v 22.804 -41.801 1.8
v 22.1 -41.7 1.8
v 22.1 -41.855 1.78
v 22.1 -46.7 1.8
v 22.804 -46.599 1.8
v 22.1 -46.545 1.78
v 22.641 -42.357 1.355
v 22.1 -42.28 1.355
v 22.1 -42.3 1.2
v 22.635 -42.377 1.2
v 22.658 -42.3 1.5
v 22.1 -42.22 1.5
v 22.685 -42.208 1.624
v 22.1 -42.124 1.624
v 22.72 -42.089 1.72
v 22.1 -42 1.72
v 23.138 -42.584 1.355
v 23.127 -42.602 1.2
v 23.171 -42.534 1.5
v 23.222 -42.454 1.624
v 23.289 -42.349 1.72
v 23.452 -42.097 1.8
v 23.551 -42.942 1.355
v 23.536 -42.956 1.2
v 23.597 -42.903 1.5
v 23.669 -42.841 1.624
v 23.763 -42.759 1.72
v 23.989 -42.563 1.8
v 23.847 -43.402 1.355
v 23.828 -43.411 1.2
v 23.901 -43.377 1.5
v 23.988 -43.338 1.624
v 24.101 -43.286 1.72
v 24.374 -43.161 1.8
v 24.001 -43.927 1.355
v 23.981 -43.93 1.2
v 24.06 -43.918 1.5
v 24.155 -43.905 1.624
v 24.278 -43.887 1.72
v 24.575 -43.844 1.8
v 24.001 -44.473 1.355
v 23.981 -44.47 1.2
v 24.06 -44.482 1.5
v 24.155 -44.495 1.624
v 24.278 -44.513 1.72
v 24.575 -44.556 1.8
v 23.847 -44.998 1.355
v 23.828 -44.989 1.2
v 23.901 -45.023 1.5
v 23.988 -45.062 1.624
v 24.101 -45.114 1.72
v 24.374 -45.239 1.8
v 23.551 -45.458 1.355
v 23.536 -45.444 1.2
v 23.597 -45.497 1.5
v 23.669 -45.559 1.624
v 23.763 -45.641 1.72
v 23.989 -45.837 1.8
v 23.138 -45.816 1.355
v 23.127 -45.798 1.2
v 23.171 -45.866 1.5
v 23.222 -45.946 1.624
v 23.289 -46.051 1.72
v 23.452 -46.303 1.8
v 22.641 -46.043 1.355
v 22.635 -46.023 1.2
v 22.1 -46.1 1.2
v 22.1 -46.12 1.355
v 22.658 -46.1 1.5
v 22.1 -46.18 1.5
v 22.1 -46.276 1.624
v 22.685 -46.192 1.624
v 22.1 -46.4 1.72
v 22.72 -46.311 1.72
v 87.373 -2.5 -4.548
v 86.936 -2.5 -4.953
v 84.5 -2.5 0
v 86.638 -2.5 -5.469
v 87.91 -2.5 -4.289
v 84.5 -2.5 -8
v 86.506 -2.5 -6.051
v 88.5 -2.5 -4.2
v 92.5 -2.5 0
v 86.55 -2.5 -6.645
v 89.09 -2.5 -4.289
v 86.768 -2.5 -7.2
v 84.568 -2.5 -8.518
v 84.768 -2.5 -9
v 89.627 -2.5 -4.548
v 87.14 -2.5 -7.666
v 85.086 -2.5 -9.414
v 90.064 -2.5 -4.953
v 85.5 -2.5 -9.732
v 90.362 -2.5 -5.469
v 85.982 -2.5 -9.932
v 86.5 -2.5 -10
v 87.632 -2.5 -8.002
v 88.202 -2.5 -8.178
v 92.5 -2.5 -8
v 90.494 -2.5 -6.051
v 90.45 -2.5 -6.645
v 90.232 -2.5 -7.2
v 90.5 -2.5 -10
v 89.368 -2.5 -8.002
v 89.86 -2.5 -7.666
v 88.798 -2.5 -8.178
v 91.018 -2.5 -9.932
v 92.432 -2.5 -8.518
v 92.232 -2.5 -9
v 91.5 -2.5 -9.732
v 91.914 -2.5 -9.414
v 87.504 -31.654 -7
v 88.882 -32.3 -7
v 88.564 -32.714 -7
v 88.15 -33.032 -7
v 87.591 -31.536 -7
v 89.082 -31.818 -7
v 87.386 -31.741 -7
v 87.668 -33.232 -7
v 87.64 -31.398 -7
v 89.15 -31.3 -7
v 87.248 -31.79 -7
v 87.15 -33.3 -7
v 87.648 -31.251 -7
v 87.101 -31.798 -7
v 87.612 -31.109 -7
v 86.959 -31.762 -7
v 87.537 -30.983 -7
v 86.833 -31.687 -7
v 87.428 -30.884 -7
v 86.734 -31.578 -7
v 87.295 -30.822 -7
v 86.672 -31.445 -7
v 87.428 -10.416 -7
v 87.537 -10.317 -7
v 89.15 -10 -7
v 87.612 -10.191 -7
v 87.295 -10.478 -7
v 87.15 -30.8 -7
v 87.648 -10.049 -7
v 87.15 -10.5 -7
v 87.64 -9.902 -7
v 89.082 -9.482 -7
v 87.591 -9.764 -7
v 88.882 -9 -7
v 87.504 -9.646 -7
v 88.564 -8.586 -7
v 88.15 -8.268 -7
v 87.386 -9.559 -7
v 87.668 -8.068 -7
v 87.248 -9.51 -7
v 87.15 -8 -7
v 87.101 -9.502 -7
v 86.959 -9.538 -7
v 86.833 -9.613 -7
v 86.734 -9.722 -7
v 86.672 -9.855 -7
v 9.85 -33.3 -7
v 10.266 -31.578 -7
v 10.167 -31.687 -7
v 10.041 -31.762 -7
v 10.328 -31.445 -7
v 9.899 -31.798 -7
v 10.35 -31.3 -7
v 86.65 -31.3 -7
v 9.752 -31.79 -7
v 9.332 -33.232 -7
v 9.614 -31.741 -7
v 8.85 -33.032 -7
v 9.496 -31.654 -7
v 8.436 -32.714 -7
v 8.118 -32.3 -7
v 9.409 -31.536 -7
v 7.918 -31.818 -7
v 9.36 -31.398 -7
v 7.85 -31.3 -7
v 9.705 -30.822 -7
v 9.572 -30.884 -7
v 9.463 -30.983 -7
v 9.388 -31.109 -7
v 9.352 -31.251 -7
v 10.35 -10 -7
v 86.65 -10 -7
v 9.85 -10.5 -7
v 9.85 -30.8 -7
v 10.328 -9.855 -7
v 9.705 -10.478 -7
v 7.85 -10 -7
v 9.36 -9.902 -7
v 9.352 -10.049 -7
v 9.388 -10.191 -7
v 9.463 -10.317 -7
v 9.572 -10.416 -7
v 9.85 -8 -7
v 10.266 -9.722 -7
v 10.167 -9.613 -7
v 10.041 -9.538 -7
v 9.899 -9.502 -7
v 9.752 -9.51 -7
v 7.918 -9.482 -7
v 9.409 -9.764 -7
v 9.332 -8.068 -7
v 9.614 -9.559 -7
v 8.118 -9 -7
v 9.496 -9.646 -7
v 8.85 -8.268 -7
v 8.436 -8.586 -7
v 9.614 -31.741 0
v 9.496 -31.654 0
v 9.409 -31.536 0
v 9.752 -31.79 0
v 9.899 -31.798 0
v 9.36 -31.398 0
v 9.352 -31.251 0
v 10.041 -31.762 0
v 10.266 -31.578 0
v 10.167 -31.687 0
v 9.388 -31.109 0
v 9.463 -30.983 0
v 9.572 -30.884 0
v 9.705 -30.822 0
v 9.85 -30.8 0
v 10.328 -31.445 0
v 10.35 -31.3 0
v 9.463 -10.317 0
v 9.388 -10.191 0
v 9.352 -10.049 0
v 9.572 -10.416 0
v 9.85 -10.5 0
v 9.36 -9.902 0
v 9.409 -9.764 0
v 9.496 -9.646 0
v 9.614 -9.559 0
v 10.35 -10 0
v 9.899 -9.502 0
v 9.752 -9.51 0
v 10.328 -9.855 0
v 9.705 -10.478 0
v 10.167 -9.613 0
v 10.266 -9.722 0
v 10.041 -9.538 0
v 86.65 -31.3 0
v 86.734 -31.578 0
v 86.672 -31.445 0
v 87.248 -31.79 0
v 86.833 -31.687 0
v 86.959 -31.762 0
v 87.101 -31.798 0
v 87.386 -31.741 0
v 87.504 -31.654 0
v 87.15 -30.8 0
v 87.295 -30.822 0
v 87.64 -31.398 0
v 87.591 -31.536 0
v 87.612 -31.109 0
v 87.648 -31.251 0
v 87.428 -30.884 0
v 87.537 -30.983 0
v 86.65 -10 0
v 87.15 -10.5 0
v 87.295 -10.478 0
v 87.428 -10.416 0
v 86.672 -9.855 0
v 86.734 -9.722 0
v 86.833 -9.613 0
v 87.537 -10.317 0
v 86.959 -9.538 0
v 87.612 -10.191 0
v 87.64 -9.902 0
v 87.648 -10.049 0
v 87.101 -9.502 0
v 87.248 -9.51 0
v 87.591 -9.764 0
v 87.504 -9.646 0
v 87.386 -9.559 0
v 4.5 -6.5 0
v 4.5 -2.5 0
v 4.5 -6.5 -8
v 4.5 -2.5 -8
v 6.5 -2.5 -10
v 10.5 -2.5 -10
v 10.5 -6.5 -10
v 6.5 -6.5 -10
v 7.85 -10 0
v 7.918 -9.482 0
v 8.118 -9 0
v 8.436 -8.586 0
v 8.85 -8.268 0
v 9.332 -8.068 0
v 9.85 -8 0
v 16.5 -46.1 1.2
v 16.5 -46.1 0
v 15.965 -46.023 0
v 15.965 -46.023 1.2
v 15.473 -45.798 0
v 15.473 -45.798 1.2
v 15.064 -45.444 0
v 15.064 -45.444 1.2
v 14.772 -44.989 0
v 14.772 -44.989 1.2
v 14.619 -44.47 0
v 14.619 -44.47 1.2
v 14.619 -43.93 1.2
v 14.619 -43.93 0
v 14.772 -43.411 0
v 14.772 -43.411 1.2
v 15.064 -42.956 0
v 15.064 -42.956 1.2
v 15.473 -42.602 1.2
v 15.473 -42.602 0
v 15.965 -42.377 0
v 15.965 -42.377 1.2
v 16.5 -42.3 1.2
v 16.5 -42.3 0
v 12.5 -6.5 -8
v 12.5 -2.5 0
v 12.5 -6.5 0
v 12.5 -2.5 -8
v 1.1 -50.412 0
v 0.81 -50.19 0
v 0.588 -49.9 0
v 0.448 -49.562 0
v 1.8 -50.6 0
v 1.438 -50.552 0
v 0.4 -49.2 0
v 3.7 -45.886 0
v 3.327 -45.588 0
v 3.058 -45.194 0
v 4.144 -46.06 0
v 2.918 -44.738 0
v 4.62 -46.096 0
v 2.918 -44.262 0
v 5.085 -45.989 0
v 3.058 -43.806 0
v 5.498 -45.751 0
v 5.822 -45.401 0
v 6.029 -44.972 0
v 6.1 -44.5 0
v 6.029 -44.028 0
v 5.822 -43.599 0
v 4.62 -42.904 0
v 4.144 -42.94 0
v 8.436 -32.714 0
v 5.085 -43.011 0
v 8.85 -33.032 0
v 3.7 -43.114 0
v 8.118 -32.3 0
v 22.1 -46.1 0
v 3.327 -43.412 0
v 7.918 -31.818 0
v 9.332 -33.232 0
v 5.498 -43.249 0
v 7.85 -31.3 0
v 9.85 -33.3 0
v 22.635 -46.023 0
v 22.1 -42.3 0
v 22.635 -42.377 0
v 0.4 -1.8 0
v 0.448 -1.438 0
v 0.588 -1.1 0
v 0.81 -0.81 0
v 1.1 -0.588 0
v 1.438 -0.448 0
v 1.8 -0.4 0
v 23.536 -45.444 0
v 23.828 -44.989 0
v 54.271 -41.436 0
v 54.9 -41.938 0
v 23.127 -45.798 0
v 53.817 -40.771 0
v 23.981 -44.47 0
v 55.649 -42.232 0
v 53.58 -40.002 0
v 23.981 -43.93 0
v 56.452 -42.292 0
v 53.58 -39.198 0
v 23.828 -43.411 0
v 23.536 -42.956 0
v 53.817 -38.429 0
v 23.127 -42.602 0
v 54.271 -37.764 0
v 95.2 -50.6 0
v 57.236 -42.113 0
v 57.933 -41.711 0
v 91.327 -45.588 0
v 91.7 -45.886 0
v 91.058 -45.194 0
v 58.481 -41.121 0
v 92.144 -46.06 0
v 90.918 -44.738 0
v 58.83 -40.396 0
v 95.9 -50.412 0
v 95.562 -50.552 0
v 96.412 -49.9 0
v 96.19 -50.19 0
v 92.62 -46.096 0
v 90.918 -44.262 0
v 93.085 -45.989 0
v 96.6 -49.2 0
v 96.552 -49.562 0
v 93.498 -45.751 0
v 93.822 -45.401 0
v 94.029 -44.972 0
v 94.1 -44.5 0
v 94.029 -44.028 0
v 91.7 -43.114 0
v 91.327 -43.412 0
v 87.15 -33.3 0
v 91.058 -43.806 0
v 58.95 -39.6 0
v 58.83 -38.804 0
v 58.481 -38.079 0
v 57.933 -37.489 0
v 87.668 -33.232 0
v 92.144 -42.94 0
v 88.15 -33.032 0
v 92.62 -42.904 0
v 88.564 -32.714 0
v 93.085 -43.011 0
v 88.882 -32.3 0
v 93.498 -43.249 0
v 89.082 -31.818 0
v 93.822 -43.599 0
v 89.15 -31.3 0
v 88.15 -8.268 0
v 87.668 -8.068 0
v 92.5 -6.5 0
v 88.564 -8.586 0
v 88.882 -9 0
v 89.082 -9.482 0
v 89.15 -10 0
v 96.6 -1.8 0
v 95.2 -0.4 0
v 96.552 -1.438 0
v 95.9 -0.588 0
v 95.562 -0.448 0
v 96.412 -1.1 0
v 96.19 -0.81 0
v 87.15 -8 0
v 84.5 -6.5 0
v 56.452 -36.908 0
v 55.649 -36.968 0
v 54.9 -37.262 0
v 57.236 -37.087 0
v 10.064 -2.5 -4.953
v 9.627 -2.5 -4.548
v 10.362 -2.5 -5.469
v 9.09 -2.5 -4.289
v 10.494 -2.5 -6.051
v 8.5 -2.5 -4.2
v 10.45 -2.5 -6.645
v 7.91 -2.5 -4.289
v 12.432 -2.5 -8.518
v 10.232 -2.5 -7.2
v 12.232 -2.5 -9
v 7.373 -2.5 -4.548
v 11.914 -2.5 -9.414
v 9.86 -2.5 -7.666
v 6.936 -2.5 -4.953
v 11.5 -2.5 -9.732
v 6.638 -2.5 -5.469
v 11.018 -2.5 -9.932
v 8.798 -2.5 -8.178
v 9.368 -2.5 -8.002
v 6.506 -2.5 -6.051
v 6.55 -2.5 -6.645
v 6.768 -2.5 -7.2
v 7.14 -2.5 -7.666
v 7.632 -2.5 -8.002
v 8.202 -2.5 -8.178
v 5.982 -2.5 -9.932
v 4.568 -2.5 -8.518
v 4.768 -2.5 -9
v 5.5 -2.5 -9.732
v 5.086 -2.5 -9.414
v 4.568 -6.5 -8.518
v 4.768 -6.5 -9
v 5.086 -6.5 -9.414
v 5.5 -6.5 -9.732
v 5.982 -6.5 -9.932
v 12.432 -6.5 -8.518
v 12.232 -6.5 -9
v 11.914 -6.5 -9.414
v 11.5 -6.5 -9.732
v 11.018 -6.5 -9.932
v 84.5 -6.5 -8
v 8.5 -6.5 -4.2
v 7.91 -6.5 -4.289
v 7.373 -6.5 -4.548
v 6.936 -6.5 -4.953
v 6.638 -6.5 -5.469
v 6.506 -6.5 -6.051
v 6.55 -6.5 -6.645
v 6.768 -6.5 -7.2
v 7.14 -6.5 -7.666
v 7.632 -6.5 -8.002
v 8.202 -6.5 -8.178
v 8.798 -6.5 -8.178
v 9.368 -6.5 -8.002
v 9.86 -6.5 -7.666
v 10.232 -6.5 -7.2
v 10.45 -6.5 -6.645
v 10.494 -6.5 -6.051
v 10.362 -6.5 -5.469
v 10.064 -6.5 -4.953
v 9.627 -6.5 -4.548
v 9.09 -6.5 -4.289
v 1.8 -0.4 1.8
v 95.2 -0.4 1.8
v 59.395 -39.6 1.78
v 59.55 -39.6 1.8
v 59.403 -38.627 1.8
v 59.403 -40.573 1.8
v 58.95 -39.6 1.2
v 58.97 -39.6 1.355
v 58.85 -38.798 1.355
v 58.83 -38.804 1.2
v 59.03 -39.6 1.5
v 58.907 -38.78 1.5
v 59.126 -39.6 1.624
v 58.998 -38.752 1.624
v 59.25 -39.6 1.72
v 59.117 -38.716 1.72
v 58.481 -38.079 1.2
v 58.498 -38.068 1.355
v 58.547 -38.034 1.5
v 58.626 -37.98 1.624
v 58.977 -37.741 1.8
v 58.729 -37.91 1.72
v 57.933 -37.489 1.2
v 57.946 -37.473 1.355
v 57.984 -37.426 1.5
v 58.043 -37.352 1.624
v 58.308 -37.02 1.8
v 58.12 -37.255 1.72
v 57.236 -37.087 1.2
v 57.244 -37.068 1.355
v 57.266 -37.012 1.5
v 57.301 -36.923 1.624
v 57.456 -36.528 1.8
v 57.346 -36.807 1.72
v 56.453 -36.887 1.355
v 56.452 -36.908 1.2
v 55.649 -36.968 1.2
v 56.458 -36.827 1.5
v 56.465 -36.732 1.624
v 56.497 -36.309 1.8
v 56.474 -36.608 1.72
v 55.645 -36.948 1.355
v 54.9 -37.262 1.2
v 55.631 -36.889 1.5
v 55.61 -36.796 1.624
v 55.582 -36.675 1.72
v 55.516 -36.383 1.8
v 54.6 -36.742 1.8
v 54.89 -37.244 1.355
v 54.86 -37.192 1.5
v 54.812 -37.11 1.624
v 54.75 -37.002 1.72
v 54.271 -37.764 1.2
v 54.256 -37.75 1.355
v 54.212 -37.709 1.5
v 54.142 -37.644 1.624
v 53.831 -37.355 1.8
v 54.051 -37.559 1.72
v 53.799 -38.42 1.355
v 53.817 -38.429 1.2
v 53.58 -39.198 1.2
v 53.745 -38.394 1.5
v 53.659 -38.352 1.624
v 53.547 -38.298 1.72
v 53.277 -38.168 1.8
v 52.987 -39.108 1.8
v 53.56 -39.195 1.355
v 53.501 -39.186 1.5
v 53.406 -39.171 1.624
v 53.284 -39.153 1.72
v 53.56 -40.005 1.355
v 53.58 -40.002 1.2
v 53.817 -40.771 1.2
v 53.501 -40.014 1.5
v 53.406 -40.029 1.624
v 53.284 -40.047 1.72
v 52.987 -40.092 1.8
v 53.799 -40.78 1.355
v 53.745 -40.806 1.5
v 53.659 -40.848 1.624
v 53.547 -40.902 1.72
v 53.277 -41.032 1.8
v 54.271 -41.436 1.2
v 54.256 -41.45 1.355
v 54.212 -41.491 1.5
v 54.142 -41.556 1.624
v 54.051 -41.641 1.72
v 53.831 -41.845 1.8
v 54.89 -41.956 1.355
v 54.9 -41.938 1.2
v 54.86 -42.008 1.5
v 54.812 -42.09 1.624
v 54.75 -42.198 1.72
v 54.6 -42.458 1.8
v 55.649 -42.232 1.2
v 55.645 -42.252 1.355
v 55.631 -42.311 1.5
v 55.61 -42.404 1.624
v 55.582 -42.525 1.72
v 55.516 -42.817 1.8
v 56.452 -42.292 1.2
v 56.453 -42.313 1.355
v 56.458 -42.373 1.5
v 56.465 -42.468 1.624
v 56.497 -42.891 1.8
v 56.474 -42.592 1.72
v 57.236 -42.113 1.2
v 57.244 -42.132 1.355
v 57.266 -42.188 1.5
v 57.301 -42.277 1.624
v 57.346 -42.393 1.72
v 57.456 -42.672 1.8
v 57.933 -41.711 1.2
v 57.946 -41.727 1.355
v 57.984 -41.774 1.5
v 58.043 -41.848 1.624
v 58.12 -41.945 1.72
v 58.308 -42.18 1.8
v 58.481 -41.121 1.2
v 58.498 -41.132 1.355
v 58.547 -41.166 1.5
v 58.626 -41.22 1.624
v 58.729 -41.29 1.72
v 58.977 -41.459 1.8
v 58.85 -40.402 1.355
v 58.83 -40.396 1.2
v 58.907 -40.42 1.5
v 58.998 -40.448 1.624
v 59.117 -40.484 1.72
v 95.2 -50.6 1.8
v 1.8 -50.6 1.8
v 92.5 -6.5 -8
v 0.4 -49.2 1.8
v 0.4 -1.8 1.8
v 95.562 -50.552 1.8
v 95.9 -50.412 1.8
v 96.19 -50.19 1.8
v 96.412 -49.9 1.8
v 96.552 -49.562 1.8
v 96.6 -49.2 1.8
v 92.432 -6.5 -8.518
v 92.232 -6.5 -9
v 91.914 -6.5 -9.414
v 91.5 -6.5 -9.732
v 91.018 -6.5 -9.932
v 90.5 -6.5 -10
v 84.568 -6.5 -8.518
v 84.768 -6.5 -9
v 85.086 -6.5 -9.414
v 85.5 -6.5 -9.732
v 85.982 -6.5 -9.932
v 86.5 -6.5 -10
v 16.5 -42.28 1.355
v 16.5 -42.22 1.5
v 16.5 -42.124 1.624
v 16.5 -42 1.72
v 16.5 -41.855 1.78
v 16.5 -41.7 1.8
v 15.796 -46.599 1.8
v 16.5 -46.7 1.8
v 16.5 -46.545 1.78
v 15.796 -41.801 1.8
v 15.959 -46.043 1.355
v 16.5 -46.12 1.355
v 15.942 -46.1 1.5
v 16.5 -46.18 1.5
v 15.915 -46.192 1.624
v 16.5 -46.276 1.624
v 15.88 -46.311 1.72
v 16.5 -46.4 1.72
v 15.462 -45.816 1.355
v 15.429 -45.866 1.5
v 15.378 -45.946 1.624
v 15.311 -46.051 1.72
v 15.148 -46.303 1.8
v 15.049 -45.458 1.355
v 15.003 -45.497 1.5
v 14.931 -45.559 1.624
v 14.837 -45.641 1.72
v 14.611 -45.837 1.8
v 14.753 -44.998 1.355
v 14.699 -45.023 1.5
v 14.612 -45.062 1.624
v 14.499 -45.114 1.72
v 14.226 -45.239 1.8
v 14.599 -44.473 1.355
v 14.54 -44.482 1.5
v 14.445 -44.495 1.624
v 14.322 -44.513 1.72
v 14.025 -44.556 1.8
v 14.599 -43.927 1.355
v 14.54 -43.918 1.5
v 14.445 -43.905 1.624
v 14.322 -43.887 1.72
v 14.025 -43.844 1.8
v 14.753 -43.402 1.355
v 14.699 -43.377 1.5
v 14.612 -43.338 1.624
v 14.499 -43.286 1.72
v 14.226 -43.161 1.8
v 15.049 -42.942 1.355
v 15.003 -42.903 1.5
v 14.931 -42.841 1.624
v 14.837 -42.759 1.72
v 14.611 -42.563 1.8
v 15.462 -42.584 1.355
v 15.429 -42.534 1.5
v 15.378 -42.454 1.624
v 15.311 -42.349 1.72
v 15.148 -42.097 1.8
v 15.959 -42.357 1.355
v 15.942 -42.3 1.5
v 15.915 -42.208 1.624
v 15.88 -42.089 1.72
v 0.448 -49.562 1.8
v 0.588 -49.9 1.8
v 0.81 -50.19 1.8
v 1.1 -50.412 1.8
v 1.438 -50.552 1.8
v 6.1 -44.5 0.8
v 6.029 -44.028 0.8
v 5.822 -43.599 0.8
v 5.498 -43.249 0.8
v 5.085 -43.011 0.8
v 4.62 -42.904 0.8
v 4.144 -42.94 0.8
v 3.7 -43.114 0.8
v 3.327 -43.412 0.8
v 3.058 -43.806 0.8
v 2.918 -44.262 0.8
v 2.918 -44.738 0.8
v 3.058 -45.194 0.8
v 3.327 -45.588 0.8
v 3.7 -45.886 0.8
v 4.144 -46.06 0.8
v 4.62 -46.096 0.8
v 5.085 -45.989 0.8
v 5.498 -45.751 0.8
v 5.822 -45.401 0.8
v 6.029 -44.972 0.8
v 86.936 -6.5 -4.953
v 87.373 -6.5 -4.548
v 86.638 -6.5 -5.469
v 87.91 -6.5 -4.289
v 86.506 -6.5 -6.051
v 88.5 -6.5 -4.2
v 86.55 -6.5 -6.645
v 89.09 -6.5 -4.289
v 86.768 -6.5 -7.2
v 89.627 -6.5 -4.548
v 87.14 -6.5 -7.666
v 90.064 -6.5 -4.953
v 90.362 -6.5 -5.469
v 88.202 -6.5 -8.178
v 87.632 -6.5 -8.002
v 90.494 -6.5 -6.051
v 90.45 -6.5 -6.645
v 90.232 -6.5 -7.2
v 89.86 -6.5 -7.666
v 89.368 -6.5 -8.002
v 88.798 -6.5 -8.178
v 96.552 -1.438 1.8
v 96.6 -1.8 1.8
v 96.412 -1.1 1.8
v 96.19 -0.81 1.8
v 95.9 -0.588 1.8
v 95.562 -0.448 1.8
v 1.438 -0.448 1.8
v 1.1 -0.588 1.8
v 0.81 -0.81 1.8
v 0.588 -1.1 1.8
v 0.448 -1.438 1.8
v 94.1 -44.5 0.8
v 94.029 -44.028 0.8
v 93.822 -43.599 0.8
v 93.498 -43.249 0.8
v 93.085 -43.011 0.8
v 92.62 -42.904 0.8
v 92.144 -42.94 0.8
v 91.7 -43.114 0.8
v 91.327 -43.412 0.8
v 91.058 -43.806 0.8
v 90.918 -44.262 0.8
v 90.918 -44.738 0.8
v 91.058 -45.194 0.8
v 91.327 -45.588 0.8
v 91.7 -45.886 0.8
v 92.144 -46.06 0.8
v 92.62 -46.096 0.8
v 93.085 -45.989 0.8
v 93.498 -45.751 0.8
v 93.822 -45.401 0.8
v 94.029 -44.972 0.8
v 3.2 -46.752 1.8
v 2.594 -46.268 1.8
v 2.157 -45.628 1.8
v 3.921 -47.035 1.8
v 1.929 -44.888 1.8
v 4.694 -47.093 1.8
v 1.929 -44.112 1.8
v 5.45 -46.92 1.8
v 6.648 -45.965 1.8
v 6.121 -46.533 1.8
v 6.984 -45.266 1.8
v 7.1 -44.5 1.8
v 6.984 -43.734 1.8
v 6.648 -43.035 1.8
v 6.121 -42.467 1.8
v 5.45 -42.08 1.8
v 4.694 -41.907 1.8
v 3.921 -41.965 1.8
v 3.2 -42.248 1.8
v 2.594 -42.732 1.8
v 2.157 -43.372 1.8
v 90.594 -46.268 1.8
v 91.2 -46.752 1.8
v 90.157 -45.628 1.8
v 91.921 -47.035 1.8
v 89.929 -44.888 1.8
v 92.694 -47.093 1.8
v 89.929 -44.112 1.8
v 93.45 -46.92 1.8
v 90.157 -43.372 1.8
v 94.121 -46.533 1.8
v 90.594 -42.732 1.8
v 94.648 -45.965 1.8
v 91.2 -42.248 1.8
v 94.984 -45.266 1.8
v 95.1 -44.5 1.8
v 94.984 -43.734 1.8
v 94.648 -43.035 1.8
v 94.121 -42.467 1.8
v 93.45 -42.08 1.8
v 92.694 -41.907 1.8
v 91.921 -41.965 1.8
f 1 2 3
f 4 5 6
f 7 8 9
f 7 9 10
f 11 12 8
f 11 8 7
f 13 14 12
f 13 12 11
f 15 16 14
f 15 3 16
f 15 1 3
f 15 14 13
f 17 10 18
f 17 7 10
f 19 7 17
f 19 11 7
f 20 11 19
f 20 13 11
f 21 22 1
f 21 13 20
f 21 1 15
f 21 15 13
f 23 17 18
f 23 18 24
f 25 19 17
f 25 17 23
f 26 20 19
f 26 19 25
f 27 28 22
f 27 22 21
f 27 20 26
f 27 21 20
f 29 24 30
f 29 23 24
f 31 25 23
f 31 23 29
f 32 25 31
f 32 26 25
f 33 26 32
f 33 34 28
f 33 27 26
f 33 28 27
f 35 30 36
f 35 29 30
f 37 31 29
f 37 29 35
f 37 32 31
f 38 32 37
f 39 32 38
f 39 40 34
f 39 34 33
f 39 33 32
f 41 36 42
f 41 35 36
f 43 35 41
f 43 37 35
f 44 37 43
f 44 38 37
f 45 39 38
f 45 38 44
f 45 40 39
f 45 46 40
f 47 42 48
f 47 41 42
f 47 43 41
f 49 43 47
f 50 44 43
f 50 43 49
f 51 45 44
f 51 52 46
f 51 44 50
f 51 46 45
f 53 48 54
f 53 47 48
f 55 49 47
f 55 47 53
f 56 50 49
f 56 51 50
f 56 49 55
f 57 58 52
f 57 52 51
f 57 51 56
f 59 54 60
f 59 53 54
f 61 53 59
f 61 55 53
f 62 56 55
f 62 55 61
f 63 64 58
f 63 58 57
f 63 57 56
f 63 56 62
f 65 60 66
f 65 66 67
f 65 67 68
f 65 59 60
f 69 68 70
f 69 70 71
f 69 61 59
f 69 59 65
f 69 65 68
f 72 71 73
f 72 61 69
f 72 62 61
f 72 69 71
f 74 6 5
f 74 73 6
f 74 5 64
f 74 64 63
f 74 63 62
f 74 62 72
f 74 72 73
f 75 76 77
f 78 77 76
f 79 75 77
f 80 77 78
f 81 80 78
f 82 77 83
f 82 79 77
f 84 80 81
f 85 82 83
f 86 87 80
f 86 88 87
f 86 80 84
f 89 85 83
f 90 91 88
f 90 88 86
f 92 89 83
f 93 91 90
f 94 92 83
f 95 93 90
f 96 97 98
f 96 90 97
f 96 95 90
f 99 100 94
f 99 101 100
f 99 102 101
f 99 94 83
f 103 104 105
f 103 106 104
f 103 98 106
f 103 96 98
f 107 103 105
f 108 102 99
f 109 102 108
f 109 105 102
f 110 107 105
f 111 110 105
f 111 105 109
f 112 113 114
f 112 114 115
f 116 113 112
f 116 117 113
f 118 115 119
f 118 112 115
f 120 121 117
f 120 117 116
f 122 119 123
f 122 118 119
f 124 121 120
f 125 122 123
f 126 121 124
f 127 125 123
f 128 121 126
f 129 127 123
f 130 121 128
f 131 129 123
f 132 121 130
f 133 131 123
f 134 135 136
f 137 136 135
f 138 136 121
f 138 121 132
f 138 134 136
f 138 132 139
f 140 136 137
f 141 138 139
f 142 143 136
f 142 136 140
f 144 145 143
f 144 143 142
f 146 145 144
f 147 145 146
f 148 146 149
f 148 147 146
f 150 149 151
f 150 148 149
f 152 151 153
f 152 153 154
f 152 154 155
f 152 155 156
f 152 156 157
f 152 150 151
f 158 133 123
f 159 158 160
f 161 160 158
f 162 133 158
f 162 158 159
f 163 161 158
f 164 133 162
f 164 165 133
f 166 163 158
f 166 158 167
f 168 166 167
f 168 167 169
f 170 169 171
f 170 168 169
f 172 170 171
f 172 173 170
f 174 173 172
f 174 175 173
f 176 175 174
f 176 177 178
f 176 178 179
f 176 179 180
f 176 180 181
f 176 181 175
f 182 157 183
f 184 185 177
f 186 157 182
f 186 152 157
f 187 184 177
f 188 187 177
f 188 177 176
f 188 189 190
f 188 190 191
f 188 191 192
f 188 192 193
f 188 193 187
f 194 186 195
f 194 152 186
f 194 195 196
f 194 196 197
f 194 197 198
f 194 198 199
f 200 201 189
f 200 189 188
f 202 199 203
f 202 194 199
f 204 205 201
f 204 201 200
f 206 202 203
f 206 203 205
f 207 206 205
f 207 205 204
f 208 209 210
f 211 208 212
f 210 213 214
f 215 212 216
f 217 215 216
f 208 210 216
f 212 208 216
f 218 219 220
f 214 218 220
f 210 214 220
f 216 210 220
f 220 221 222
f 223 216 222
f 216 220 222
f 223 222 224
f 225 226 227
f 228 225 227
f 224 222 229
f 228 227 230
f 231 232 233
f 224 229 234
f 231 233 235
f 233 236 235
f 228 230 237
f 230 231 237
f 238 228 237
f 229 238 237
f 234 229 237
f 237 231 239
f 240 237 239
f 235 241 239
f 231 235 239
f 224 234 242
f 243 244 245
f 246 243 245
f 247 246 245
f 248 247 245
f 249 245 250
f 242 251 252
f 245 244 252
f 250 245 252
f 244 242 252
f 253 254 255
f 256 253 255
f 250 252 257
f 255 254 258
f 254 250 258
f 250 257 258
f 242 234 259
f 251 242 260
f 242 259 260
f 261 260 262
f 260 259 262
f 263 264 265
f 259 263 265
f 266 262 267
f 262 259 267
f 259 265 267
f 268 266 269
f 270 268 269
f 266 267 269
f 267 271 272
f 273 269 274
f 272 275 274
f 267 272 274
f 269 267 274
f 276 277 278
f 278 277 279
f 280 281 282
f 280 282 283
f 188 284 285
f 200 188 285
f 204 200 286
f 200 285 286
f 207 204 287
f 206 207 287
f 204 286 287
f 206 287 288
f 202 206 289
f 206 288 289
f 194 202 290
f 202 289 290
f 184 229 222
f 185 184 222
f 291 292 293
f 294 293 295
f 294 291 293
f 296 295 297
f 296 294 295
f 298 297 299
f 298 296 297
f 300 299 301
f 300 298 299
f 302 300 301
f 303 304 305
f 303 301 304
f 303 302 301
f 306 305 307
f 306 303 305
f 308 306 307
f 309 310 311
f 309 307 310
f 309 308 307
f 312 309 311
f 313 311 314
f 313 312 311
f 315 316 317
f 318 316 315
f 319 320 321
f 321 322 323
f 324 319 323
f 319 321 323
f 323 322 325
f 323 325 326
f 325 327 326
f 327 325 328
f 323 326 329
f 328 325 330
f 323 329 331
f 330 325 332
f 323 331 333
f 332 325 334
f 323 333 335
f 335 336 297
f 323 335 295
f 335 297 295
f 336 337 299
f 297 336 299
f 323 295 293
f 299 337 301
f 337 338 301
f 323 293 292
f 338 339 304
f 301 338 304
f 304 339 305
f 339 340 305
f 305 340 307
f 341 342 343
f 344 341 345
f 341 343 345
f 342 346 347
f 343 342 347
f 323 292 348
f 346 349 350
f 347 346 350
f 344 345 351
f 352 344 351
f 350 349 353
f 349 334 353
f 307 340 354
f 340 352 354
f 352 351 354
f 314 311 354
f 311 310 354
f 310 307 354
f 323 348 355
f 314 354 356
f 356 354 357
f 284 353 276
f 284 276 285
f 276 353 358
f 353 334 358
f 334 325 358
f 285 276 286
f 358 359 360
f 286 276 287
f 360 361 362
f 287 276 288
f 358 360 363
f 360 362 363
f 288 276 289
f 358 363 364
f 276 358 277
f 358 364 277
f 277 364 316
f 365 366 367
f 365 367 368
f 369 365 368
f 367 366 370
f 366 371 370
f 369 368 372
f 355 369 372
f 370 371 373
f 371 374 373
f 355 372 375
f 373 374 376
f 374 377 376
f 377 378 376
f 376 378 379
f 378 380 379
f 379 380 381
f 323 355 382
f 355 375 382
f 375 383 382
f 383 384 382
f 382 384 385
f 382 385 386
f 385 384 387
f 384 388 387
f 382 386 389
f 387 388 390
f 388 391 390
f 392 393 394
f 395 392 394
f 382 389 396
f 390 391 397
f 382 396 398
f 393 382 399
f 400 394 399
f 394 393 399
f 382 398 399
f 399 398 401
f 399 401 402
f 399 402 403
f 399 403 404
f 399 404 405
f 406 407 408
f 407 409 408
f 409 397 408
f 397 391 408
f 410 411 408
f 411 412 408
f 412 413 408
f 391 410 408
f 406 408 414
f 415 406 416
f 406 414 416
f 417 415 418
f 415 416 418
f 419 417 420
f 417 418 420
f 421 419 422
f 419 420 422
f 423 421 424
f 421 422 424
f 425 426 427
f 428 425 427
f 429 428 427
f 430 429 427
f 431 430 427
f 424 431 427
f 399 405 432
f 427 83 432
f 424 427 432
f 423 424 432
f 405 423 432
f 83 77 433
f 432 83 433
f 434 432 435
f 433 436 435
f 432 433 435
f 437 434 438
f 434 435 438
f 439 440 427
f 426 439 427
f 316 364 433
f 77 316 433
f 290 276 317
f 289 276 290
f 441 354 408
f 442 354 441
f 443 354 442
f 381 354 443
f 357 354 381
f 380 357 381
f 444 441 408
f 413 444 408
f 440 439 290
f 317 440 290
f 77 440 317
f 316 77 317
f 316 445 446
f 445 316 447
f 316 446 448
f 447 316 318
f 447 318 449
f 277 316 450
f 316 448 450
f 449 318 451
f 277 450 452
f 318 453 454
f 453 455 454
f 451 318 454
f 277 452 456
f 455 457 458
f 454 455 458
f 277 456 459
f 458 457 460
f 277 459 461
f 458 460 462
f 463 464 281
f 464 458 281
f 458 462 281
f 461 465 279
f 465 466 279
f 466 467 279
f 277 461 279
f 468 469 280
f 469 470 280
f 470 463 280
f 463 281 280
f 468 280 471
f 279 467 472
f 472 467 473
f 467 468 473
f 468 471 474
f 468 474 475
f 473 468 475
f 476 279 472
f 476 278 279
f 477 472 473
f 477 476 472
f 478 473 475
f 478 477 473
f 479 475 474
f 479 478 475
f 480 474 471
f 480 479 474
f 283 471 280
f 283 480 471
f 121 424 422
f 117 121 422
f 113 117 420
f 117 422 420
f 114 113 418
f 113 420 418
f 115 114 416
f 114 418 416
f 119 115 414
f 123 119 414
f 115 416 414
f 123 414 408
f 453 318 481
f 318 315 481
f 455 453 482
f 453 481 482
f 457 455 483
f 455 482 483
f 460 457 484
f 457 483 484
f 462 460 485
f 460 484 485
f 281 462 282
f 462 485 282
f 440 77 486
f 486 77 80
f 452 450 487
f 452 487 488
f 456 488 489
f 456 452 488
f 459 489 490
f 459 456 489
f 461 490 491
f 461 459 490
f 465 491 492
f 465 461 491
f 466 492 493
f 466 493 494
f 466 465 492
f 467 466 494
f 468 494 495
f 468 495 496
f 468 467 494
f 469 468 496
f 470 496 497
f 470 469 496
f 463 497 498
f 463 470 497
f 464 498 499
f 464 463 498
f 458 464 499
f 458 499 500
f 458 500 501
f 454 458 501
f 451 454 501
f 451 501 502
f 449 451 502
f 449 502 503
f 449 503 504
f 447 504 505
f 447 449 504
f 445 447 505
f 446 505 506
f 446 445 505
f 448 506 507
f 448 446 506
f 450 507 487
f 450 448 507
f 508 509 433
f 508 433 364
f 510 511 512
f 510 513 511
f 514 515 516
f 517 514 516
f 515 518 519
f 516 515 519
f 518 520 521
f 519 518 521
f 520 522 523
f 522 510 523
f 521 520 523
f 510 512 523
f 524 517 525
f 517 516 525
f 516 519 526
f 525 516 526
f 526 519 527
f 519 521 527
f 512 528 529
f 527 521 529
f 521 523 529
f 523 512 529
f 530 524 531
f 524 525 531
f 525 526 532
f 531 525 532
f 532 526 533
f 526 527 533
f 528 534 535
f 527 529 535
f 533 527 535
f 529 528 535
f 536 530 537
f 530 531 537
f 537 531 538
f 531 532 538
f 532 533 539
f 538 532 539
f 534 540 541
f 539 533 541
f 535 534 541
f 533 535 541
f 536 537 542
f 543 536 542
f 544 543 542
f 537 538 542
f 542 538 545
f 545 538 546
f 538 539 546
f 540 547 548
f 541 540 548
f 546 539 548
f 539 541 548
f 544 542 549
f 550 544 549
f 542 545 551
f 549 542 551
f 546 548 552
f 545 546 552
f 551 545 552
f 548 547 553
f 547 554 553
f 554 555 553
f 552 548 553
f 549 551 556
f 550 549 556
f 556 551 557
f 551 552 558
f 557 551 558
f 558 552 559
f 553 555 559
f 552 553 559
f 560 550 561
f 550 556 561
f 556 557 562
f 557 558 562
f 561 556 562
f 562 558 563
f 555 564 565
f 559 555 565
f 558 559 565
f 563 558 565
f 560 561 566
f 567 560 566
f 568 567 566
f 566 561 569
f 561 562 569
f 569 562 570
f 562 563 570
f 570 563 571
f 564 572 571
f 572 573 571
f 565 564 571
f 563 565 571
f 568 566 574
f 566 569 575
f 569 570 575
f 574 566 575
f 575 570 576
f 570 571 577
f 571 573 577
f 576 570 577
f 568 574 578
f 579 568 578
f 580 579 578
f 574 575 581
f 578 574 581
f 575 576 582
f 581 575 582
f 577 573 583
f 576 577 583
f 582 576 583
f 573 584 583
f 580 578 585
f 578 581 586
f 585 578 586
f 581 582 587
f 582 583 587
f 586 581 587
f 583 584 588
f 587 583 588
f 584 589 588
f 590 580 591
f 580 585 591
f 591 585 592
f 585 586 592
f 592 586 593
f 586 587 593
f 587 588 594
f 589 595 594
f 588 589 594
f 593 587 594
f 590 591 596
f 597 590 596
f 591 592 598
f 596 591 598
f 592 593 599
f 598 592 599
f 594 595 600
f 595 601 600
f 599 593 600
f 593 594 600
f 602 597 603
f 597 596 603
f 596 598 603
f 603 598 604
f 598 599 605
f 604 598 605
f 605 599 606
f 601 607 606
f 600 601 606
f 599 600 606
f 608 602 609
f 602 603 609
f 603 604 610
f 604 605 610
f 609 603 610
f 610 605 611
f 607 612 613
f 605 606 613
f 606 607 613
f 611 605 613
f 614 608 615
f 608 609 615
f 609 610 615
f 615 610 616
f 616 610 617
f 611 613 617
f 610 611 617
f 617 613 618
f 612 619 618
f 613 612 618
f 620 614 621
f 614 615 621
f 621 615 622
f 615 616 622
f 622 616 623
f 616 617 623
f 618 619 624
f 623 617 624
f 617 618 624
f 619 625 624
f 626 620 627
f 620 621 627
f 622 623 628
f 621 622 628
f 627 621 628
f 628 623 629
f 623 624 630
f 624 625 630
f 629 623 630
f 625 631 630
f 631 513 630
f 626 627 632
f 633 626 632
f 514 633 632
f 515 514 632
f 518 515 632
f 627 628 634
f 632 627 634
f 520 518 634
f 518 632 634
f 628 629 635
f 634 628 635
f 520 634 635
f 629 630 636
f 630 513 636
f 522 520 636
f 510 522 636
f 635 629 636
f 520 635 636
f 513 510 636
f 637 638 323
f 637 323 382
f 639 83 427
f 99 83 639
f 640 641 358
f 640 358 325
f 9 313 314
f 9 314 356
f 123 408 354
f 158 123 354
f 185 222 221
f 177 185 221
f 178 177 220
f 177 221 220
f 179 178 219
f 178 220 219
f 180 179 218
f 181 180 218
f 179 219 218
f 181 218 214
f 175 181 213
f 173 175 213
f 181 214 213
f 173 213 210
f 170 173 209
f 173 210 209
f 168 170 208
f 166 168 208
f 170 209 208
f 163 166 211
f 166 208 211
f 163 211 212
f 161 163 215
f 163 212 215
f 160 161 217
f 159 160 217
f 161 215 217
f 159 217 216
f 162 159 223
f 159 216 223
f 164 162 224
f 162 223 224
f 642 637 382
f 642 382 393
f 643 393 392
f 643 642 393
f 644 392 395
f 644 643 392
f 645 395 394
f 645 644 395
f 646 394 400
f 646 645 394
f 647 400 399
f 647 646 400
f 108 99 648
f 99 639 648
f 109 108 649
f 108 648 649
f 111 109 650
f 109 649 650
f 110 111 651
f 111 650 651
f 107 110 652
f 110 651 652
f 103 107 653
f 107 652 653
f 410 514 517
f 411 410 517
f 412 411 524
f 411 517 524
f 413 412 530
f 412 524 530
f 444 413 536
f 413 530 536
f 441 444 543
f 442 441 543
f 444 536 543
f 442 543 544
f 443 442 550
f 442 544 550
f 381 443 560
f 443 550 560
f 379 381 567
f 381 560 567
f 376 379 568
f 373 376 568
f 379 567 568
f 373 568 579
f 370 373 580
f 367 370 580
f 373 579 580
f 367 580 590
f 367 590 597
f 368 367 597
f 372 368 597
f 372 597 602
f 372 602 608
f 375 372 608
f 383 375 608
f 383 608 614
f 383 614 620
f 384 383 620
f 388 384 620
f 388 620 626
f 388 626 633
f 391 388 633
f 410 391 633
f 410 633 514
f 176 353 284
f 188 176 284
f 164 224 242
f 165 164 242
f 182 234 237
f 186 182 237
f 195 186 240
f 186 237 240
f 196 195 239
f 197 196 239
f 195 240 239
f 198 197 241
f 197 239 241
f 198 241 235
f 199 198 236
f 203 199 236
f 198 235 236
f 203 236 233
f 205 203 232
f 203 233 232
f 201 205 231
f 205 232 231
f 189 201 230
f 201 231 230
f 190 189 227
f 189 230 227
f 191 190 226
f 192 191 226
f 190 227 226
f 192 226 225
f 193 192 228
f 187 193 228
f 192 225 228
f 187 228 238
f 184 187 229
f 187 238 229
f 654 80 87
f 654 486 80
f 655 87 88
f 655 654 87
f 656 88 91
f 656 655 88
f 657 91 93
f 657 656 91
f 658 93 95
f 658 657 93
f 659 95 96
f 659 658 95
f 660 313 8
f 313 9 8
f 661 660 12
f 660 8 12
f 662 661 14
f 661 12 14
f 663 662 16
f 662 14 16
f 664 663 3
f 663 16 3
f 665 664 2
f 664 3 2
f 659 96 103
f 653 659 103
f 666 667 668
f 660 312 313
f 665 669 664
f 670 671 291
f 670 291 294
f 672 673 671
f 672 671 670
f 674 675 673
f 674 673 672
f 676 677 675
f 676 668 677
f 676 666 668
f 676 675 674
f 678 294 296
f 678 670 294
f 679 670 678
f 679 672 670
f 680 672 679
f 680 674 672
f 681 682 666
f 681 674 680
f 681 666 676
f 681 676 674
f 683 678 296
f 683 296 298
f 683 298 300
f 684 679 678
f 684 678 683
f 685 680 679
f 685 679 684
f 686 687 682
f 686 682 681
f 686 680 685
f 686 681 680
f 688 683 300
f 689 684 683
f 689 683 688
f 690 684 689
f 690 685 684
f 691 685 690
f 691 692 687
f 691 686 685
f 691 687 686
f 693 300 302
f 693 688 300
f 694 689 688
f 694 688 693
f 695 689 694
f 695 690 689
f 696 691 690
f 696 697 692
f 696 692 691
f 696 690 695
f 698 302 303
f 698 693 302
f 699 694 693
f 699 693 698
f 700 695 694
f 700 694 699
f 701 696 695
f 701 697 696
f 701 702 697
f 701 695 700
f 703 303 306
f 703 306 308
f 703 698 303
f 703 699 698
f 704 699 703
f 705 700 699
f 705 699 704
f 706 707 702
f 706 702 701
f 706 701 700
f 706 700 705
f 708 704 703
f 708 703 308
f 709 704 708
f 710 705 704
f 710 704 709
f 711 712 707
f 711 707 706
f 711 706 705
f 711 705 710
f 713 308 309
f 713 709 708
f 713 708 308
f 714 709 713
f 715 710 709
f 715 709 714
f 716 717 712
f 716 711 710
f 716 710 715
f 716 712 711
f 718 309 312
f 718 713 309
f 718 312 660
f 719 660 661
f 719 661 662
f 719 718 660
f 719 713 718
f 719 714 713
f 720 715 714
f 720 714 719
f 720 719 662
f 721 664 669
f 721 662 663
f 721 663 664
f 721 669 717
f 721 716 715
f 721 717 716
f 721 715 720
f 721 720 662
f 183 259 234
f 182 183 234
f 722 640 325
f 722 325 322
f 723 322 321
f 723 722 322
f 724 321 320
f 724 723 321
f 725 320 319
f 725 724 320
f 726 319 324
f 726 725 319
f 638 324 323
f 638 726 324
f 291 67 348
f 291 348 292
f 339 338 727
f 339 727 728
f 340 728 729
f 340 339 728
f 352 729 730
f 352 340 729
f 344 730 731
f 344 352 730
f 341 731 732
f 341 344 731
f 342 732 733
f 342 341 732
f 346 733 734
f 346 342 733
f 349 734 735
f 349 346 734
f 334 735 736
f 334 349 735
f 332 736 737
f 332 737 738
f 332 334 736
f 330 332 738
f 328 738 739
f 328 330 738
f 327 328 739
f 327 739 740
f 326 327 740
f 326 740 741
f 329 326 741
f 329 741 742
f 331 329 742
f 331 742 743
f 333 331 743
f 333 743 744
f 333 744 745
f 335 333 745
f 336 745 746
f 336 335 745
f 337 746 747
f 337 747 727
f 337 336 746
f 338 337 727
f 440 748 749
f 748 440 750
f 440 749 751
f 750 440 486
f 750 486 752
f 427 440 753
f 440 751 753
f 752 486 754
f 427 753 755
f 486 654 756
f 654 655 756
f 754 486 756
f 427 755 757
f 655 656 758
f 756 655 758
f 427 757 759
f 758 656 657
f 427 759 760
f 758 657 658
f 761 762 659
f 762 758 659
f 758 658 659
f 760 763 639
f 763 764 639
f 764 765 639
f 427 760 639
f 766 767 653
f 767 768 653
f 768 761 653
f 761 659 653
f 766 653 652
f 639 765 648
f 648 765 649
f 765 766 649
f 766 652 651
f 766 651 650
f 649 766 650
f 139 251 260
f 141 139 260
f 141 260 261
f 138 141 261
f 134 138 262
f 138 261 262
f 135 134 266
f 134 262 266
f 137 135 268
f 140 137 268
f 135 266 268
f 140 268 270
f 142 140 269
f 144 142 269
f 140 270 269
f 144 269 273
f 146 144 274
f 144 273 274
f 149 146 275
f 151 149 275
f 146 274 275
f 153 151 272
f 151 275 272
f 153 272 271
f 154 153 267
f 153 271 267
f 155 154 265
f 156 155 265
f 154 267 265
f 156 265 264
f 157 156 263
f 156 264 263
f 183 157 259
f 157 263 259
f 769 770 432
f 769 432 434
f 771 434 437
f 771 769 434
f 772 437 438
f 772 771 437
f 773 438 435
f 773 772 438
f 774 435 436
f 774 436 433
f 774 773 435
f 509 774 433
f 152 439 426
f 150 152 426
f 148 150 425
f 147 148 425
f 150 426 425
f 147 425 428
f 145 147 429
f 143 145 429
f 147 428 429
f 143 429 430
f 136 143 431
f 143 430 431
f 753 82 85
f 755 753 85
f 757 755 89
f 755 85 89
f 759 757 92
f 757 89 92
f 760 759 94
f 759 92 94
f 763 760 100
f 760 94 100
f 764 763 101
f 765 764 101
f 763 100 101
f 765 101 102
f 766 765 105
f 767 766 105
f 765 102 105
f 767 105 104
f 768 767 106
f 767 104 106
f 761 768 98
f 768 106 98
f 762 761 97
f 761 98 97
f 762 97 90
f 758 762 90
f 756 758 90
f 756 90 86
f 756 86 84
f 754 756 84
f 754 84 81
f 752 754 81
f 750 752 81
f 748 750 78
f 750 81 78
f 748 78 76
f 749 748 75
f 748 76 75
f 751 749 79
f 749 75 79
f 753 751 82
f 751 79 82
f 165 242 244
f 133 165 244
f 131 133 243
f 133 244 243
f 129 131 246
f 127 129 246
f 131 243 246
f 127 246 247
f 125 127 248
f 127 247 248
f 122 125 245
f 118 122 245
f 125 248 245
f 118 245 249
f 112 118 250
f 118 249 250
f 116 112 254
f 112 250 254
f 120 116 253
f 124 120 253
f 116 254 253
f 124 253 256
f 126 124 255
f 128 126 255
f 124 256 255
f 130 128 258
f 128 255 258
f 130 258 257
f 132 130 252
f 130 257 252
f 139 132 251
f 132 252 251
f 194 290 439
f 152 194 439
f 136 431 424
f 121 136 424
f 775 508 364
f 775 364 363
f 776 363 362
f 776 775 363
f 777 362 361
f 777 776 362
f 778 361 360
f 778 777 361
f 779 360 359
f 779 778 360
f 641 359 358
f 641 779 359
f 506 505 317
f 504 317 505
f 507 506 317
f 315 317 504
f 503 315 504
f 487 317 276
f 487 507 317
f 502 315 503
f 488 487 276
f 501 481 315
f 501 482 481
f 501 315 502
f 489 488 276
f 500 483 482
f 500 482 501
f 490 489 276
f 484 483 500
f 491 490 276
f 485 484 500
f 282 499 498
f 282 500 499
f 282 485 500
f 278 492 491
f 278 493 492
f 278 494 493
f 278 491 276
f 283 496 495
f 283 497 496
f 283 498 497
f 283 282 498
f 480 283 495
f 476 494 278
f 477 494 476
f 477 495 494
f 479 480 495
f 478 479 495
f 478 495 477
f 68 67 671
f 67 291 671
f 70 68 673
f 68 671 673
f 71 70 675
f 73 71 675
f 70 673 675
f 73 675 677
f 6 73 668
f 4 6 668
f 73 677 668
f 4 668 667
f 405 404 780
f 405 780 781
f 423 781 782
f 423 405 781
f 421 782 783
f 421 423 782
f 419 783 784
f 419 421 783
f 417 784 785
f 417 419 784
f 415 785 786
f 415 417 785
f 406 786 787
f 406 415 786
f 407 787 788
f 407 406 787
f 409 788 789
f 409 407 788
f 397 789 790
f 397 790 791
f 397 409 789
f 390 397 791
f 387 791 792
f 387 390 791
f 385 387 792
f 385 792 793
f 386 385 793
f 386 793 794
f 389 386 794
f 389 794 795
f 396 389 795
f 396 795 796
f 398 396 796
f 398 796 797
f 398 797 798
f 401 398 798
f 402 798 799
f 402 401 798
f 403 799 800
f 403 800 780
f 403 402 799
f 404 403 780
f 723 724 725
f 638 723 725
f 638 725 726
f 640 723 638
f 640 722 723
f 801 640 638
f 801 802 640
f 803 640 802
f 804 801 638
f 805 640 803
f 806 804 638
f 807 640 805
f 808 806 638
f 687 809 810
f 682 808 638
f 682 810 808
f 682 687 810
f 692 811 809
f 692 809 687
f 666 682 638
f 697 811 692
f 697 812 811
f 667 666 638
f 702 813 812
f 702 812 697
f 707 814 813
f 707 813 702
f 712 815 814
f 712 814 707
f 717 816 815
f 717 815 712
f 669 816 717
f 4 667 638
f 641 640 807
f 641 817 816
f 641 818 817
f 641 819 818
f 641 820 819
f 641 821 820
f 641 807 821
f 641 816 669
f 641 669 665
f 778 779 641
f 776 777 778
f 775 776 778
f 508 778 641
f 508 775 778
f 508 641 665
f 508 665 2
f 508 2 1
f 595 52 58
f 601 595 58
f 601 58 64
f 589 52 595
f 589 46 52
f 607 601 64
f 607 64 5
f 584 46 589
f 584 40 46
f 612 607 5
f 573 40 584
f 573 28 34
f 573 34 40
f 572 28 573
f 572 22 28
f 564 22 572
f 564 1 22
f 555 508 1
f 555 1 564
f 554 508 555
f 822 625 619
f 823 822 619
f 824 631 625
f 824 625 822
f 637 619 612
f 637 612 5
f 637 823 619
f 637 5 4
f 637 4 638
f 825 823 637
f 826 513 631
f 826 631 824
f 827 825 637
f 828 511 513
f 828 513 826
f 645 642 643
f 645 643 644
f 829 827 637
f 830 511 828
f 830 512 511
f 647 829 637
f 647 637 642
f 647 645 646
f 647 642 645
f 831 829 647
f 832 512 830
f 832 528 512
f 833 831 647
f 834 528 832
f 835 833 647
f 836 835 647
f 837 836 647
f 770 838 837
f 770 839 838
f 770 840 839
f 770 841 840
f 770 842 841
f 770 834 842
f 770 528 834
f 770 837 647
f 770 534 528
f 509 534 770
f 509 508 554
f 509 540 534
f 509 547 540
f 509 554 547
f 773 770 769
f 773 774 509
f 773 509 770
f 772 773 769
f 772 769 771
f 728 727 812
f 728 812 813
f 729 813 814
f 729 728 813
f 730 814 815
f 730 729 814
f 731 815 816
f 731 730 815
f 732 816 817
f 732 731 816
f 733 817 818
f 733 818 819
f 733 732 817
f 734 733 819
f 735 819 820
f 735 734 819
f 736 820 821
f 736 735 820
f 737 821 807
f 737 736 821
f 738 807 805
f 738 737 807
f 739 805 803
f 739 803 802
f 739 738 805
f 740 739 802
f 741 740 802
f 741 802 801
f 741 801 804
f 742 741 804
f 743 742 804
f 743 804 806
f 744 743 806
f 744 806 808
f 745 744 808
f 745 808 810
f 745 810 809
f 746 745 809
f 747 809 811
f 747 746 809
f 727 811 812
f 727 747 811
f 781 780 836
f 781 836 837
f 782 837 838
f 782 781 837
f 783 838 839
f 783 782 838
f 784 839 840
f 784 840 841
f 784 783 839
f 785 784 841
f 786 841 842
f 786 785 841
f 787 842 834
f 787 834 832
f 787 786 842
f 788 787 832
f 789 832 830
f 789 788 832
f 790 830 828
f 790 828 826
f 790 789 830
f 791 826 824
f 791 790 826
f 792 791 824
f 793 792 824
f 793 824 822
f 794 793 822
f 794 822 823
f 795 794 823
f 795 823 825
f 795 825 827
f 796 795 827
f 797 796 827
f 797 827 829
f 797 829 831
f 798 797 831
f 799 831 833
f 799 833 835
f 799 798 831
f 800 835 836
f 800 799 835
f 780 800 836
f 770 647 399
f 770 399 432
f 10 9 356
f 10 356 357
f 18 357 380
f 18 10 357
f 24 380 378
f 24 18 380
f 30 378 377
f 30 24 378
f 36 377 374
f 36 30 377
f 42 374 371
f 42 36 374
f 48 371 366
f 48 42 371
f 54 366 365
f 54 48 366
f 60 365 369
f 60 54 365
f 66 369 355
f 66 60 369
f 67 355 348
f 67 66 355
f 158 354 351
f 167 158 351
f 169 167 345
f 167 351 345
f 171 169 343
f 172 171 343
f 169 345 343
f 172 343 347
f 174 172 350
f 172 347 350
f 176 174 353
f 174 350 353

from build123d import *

# Parameters (mm, degrees)
SKETCH1_W            = 97
SKETCH1_H            = 51
SKETCH1_R            = 1.6
BOSS_EXTRUDE1_DEPTH  = 1.8
FILLET1_R            = 2
SKETCH4_W            = 8
SKETCH4_H            = 10
SKETCH4_R            = 2
BOSS_EXTRUDE3_DEPTH  = 4
FILLET2_R            = 2
FILLET2_OF_MIRROR1_R = 2
BOSS_EXTRUDE4_DEPTH  = 7
SKETCH7_R            = 2.7
CUT_EXTRUDE3_DEPTH   = 111.223590941
CUT_EXTRUDE4_DEPTH   = 111.223590941
FILLET3_R            = 0.6
CHAMFER1_SIZE        = 1
SKETCH9_W            = 97
SKETCH9_H            = 51
CUT_EXTRUDE5_DEPTH   = 111.223590941


with BuildPart() as part:
    # Sketch1 → Boss-Extrude1 (new body)
    with BuildSketch(Plane.XY):
        with Locations((48.5, -25.5)):
            Rectangle(SKETCH1_W, SKETCH1_H)
        with Locations((92.5, -44.5)):
            Circle(SKETCH1_R, mode=Mode.SUBTRACT)
        with Locations((4.5, -44.5)):
            Circle(SKETCH1_R, mode=Mode.SUBTRACT)
    extrude(amount=BOSS_EXTRUDE1_DEPTH)

    # Fillet1
    fillet1_edges = [part.edges().sort_by_distance(p)[0] for p in [
        (0, 0, 0.9),
        (97, 0, 0.9),
        (97, -51, 0.9),
        (0, -51, 0.9),
    ]]
    fillet(fillet1_edges, radius=FILLET1_R)

    # Sketch4 → Boss-Extrude3 (add)
    with BuildSketch(Plane(origin=(0, -2.5, 0), x_dir=(1, 0, 0), z_dir=(0, 1, 0))):
        with Locations((88.5, 5)):
            Rectangle(SKETCH4_W, SKETCH4_H)
        with Locations(Location((88.5, 6.2, 0), (0, 0, 270))):
            Circle(SKETCH4_R, mode=Mode.SUBTRACT)
    boss_extrude3 = extrude(amount=-BOSS_EXTRUDE3_DEPTH)

    # Fillet2
    fillet2_edges = [part.edges().sort_by_distance(p)[0] for p in [
        (84.5, -4.5, -10),
        (92.5, -4.5, -10),
    ]]
    fillet(fillet2_edges, radius=FILLET2_R)

    # Mirror1: Boss-Extrude3 across plane
    add(boss_extrude3.mirror(Plane(origin=(48.5, 0, 0), x_dir=(0, 0, 1), z_dir=(1, 0, 0))))

    # Fillet2 of Mirror1
    fillet2_of_mirror1_edges = [part.edges().sort_by_distance(p)[0] for p in [
        (12.5, -4.5, -10),
        (4.5, -4.5, -10),
    ]]
    fillet(fillet2_of_mirror1_edges, radius=FILLET2_OF_MIRROR1_R)

    # Sketch5 → Boss-Extrude4 (add)
    with BuildSketch(Plane(origin=(0, 0, 0), x_dir=(-1, 0, 0), z_dir=(0, 0, -1))):
        with BuildLine():
            Line((-89.15, -10), (-89.15, -31.3))
            ThreePointArc((-89.15, -31.3), (-88.564213562, -32.714213562), (-87.15, -33.3))
            Line((-87.15, -33.3), (-9.85, -33.3))
            ThreePointArc((-9.85, -33.3), (-8.435786438, -32.714213562), (-7.85, -31.3))
            Line((-7.85, -31.3), (-7.85, -10))
            ThreePointArc((-7.85, -10), (-8.435786438, -8.585786438), (-9.85, -8))
            Line((-9.85, -8), (-87.15, -8))
            ThreePointArc((-87.15, -8), (-88.564213562, -8.585786438), (-89.15, -10))
        make_face()
        with BuildLine():
            Line((-86.65, -10), (-10.35, -10))
            ThreePointArc((-10.35, -10), (-9.496446609, -9.646446609), (-9.85, -10.5))
            Line((-9.85, -10.5), (-9.85, -30.8))
            ThreePointArc((-9.85, -30.8), (-9.496446609, -31.653553391), (-10.35, -31.3))
            Line((-10.35, -31.3), (-86.65, -31.3))
            ThreePointArc((-86.65, -31.3), (-87.503553391, -31.653553391), (-87.15, -30.8))
            Line((-87.15, -30.8), (-87.15, -10.5))
            ThreePointArc((-87.15, -10.5), (-87.503553391, -9.646446609), (-86.65, -10))
        make_face(mode=Mode.SUBTRACT)
    extrude(amount=BOSS_EXTRUDE4_DEPTH)

    # Sketch7 → Cut-Extrude3 (cut, through all)
    with BuildSketch(Plane.XY.offset(1.8)):
        with Locations((56.25, -39.6)):
            Circle(SKETCH7_R)
    extrude(amount=-CUT_EXTRUDE3_DEPTH, mode=Mode.SUBTRACT)

    # Sketch8 → Cut-Extrude4 (cut, through all)
    with BuildSketch(Plane.XY.offset(1.8)):
        with BuildLine():
            Line((16.5, -42.3), (22.1, -42.3))
            ThreePointArc((22.1, -42.3), (24, -44.2), (22.1, -46.1))
            Line((22.1, -46.1), (16.5, -46.1))
            ThreePointArc((16.5, -46.1), (14.6, -44.2), (16.5, -42.3))
        make_face()
    extrude(amount=-CUT_EXTRUDE4_DEPTH, mode=Mode.SUBTRACT)

    # Fillet3
    fillet3_edges = [part.edges().sort_by_distance(p)[0] for p in [
        (53.55, -39.6, 1.8),
        (14.6, -44.2, 1.8),
        (19.3, -46.1, 1.8),
        (24, -44.2, 1.8),
        (19.3, -42.3, 1.8),
    ]]
    fillet(fillet3_edges, radius=FILLET3_R)

    # Chamfer1
    chamfer1_edges = [part.edges().sort_by_distance(p)[0] for p in [
        (90.9, -44.5, 1.8),
        (2.9, -44.5, 1.8),
    ]]
    chamfer(chamfer1_edges, length=CHAMFER1_SIZE)

    # Sketch9 → Cut-Extrude5 (cut, through all)
    with BuildSketch(Plane.XY.offset(1.8)):
        with Locations((48.5, -25.5)):
            Rectangle(SKETCH9_W, SKETCH9_H)
        with BuildLine():
            Line((0.4, -1.8), (0.4, -49.2))
            ThreePointArc((0.4, -49.2), (0.810050506, -50.189949494), (1.8, -50.6))
            Line((1.8, -50.6), (95.2, -50.6))
            ThreePointArc((95.2, -50.6), (96.189949494, -50.189949494), (96.6, -49.2))
            Line((96.6, -49.2), (96.6, -1.8))
            ThreePointArc((96.6, -1.8), (96.189949494, -0.810050506), (95.2, -0.4))
            Line((95.2, -0.4), (1.8, -0.4))
            ThreePointArc((1.8, -0.4), (0.810050506, -0.810050506), (0.4, -1.8))
        make_face(mode=Mode.SUBTRACT)
    extrude(amount=-CUT_EXTRUDE5_DEPTH, mode=Mode.SUBTRACT)


solid = part.part
